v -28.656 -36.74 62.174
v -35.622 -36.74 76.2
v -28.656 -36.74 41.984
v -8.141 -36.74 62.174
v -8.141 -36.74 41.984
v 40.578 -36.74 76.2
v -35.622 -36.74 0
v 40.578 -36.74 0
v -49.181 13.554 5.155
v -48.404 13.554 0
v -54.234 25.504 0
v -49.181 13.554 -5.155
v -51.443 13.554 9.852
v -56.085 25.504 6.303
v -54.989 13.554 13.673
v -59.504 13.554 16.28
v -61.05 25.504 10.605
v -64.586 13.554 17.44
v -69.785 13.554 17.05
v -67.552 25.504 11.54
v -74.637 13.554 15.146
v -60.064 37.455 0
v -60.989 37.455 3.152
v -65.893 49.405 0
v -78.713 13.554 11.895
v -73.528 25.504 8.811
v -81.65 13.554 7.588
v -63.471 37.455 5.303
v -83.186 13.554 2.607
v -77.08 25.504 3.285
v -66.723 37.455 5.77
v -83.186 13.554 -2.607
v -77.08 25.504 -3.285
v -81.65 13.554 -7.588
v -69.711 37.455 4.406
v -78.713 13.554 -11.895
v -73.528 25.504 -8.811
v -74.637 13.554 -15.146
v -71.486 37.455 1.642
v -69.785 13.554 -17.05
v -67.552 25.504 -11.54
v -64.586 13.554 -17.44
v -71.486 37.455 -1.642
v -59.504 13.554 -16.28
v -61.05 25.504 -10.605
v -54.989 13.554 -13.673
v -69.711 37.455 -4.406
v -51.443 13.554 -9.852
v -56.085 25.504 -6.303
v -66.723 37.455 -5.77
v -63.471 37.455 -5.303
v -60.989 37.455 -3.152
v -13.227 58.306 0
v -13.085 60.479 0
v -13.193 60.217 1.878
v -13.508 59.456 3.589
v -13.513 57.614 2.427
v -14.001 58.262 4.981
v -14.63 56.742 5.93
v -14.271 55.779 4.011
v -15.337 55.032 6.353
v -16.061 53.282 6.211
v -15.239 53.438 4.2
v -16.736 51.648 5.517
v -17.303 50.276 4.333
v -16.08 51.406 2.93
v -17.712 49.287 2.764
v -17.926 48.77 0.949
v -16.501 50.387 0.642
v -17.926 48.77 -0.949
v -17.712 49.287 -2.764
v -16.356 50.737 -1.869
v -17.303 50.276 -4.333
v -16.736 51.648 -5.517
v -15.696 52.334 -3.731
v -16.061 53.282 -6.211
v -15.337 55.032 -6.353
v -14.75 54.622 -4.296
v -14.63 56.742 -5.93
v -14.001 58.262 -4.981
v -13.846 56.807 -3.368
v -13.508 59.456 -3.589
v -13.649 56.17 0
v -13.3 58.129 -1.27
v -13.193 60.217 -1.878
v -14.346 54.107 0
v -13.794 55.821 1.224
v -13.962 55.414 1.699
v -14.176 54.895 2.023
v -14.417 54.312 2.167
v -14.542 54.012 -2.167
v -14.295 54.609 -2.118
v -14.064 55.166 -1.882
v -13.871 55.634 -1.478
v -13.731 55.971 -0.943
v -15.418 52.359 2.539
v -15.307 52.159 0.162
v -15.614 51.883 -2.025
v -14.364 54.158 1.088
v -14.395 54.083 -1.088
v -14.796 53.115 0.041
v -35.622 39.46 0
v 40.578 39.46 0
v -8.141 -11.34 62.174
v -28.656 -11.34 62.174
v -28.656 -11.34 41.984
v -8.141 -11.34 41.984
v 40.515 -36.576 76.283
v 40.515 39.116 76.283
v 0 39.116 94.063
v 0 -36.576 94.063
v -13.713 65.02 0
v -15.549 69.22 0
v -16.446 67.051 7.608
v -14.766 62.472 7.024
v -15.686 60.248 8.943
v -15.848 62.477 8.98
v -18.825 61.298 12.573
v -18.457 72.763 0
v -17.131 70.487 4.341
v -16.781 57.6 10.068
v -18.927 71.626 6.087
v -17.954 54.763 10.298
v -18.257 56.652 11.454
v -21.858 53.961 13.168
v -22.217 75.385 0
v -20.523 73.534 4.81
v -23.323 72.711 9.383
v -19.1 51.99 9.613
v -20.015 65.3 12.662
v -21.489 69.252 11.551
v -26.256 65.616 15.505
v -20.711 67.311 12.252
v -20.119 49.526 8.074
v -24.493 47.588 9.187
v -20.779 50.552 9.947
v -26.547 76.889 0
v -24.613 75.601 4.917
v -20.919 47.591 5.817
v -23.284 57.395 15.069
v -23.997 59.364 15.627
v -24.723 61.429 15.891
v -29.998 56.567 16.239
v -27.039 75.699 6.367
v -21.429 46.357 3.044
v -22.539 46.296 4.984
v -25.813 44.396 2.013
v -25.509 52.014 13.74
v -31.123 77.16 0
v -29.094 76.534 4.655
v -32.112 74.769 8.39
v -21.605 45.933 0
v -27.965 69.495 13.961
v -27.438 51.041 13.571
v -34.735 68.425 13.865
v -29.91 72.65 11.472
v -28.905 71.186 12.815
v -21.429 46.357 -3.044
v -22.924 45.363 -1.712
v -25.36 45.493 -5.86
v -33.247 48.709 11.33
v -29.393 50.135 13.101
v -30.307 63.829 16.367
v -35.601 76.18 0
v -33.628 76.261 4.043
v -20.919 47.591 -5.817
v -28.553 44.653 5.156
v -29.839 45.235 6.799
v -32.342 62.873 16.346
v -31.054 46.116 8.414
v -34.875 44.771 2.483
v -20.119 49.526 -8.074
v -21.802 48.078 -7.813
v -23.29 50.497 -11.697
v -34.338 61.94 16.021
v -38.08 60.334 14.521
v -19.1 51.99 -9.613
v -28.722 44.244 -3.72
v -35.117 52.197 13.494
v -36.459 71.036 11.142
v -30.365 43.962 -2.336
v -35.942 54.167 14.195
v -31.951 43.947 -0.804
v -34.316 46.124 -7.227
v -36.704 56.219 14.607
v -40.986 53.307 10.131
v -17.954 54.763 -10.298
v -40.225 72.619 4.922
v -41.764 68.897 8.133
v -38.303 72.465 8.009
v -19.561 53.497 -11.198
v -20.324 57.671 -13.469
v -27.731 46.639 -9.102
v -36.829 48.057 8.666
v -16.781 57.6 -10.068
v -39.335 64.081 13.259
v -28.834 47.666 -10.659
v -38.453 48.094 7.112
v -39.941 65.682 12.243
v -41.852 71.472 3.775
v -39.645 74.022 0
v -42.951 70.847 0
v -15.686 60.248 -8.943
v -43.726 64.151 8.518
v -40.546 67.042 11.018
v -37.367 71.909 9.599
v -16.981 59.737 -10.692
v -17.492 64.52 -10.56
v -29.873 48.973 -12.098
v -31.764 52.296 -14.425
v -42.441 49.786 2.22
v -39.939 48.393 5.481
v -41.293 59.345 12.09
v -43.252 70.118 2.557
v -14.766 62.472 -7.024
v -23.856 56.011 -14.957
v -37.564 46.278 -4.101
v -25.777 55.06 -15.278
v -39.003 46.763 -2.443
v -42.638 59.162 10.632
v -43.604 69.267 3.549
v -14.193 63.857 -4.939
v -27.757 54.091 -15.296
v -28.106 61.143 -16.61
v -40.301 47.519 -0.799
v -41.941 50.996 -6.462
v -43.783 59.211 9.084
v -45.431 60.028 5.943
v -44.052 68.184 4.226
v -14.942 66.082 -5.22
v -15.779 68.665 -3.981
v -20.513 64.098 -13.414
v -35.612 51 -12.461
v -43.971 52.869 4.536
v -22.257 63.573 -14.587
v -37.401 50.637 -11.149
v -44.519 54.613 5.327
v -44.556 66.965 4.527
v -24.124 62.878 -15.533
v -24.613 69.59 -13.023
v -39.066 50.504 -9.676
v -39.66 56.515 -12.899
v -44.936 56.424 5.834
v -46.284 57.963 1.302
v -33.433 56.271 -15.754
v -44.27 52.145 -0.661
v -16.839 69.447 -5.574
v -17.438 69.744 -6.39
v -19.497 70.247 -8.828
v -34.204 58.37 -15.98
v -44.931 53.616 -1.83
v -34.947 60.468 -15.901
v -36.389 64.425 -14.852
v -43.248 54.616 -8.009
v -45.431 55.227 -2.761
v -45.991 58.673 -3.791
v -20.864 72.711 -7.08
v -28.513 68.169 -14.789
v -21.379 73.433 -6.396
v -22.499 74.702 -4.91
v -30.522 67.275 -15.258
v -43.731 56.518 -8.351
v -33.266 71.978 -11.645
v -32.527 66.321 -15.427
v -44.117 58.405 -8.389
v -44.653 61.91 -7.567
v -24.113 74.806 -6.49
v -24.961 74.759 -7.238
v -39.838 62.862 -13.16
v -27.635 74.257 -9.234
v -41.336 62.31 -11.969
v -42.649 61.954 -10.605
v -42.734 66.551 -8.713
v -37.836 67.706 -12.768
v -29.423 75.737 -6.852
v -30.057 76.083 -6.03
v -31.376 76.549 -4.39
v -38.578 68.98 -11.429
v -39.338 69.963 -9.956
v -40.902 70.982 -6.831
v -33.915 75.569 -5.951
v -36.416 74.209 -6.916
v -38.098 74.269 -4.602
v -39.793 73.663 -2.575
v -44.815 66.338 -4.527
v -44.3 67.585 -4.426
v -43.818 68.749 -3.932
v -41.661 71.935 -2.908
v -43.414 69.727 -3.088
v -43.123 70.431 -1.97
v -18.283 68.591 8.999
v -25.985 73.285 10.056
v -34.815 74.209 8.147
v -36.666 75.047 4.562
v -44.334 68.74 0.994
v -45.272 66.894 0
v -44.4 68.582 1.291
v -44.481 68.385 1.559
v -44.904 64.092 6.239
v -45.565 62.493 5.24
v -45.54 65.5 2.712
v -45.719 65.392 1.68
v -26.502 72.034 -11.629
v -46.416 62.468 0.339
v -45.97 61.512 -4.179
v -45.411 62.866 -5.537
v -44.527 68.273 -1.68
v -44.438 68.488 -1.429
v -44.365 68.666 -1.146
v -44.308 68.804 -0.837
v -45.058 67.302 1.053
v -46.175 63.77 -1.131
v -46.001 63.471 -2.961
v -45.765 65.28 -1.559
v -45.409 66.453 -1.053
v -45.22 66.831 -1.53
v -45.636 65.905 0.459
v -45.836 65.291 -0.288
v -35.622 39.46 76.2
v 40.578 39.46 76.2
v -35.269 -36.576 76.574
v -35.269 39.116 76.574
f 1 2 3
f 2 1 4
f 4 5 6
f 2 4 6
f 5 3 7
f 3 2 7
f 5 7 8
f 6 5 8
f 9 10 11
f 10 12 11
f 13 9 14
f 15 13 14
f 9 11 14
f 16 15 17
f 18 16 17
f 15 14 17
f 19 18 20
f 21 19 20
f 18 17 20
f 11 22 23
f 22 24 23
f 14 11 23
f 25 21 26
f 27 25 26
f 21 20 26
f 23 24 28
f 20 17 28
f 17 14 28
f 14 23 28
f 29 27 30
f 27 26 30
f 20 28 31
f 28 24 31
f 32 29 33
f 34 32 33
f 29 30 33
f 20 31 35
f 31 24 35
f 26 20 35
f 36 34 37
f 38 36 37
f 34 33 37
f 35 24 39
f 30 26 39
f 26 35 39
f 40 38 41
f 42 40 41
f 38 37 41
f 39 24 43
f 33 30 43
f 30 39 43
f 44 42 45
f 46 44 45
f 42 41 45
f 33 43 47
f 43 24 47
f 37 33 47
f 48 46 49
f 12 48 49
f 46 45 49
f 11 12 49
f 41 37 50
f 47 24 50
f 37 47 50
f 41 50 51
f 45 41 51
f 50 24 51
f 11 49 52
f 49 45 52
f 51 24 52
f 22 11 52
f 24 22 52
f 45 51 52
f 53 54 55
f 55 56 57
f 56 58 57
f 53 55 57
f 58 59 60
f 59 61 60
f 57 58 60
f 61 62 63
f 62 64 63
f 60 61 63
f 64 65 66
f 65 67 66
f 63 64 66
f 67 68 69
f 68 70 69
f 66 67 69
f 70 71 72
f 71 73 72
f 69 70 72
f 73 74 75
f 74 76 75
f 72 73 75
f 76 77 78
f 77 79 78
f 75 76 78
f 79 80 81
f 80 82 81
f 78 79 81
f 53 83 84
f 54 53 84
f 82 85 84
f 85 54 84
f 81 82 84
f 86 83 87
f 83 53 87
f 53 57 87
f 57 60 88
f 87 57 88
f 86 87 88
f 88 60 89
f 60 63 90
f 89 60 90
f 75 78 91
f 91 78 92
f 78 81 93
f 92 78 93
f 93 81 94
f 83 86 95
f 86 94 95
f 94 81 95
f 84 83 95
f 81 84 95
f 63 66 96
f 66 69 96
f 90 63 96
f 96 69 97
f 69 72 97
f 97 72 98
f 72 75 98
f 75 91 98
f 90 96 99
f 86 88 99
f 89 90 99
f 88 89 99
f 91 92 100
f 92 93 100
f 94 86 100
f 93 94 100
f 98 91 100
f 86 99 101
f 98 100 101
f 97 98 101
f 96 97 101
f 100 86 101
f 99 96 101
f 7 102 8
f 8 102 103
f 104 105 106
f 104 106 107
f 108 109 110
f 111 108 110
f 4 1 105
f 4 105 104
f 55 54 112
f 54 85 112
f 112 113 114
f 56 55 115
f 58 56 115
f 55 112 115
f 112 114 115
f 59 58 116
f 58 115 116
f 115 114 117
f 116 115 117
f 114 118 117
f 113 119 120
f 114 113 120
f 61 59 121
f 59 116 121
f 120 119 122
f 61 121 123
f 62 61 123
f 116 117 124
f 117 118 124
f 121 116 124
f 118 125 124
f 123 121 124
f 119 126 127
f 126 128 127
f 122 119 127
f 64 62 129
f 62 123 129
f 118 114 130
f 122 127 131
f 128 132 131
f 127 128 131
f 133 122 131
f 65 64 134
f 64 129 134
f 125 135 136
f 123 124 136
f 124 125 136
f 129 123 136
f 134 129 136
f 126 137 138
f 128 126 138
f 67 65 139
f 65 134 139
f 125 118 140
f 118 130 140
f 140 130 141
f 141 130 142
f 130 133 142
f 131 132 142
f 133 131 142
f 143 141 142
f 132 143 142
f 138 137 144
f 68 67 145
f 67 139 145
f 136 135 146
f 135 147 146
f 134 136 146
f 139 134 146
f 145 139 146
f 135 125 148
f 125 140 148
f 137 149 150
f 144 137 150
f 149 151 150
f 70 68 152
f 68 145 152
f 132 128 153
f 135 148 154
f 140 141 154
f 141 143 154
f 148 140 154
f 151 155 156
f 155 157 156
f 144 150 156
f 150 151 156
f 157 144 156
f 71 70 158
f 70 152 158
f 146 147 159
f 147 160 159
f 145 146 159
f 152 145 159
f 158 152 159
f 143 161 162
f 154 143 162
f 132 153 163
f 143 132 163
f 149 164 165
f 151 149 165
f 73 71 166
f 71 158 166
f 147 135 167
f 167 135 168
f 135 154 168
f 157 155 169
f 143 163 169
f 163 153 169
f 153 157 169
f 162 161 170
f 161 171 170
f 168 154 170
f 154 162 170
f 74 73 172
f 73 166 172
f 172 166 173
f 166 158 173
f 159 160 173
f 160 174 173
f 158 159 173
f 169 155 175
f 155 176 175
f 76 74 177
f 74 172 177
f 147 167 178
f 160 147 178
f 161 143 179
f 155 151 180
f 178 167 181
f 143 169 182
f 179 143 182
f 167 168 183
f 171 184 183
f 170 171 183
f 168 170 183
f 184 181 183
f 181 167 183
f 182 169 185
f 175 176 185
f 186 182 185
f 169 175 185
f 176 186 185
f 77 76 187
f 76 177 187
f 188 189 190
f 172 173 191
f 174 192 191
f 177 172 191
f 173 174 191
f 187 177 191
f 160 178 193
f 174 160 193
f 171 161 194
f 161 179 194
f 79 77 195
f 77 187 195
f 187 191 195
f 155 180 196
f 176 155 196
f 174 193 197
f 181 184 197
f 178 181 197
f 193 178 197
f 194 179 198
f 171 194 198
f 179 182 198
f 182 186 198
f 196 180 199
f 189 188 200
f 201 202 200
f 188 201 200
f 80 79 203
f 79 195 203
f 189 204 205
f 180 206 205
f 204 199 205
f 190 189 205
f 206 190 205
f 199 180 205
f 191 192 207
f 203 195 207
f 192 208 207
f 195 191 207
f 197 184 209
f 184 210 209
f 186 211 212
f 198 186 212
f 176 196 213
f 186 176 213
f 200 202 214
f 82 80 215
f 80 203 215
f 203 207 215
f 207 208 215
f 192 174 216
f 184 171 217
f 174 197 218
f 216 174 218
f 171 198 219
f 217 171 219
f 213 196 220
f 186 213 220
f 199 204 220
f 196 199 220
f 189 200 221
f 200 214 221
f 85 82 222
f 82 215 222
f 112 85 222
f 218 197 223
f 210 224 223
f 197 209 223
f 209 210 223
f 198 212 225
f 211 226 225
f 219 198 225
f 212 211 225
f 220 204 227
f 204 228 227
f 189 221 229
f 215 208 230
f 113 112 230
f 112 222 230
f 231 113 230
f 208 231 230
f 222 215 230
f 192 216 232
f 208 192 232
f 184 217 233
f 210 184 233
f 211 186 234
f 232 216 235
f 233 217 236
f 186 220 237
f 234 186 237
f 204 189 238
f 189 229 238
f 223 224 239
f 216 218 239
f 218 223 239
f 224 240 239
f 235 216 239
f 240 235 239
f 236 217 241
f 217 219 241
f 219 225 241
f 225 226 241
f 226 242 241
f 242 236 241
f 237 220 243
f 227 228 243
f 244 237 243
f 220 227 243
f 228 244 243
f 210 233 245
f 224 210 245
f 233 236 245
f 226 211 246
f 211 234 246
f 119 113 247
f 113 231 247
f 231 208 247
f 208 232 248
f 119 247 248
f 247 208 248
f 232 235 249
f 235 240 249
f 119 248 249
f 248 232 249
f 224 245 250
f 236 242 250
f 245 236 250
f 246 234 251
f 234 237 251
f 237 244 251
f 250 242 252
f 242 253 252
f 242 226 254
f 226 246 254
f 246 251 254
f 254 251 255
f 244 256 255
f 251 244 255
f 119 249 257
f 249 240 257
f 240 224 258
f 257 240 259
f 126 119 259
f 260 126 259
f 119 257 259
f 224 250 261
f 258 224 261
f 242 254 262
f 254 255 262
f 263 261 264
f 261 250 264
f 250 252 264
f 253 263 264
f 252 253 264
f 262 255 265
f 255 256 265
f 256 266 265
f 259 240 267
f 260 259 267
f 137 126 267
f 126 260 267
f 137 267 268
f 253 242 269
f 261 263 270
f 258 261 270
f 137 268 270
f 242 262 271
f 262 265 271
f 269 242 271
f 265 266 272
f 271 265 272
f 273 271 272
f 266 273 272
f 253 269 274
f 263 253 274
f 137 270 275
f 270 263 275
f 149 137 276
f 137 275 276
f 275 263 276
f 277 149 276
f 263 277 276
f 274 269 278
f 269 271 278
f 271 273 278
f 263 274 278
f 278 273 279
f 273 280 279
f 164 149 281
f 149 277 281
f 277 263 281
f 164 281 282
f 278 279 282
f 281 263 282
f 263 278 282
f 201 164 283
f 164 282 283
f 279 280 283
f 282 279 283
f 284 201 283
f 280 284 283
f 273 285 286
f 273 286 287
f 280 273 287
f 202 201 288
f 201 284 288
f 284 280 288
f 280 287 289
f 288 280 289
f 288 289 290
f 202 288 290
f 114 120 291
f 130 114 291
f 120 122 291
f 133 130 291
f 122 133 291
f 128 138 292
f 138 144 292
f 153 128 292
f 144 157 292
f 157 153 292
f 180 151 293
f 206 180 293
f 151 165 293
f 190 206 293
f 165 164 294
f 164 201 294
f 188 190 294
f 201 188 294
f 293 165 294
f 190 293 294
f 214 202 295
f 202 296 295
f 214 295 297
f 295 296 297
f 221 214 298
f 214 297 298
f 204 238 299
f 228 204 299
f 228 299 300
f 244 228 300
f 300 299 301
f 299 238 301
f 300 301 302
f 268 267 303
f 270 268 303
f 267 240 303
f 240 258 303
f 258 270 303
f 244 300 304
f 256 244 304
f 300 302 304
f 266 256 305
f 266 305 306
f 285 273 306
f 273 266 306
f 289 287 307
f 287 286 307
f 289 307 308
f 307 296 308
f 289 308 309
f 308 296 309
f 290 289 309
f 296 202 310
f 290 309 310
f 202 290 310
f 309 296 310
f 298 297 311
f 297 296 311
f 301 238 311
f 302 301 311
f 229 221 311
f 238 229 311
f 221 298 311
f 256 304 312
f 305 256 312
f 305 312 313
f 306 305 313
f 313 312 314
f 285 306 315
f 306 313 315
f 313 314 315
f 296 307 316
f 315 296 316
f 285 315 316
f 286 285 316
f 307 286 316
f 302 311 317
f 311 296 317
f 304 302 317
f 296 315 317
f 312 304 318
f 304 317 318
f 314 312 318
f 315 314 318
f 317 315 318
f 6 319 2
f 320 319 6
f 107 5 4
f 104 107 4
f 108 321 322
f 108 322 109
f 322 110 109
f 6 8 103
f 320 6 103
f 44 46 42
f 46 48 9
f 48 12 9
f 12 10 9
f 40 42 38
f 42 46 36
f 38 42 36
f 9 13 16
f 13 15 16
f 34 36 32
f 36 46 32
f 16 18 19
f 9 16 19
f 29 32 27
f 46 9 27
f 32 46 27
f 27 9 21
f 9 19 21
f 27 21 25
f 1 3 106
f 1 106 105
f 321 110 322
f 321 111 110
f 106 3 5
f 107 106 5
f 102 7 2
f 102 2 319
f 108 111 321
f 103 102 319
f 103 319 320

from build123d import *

# Parameters (mm, degrees)
F0_W          = 76.2
F0_H          = 76.2
F1_DEPTH      = 76.2
F3_DEPTH      = 36.576
F3_DEPTH_BACK = 39.116
F4_W          = 20.5152919516
F4_H          = 20.1896540821
F5_DEPTH      = 25.4


with BuildPart() as f1:
    # F0 (on Top) → F1 (new body)
    with BuildSketch(Plane.XY):
        with Locations((2.4775415659, 1.3604956046)):
            Rectangle(F0_W, F0_H)
    extrude(amount=F1_DEPTH)

    # F4 (on face) → F5 (cut)
    with BuildSketch(Plane.XZ.offset(36.7395043954)):
        with Locations((-18.3986336924, 52.0787220448)):
            Rectangle(F4_W, F4_H)
    extrude(amount=-F5_DEPTH, mode=Mode.SUBTRACT)


with BuildPart() as f3:
    # F2 (on Front) → F3 (new body, two sides)
    with BuildSketch(Plane.XZ) as f3_sk:
        Polygon((0, 94.062961638), (-35.2685265243, 76.5744373202), (40.5150838196, 76.2829631567), align=None)
    extrude(amount=F3_DEPTH)
    extrude(f3_sk.sketch, amount=-F3_DEPTH_BACK)


with BuildPart() as f7:
    # F6 (on Top) → F7 (revolve)
    with BuildSketch(Plane.XY):
        Polygon((-48.4044924378, 13.5536063462), (-65.8930167556, 49.4050830603), (-65.8930167556, 13.5536063462), align=None)
    revolve(axis=Axis((-65.8930167556, 31.4793447033, 0), (0, -1, 0)))


with BuildPart() as f9:
    # F8 (on Top) → F9 (revolve)
    with BuildSketch(Plane.XY):
        with BuildLine():
            ThreePointArc((-14.3457819904, 54.1065082938), (-13.4031332861, 57.2308972482), (-13.0848816663, 60.4788364139))
            ThreePointArc((-13.0848816663, 60.4788364139), (-26.5470794009, 76.8887728412), (-45.2717542648, 66.893607378))
            Line((-45.2717542648, 66.893607378), (-14.3457819904, 54.1065082938))
        make_face()
    revolve(axis=Axis((-29.8087681276, 60.5000578359, 0), (0.9241208389, -0.3821003469, 0)))


solid = Compound([f1.part, f3.part, f7.part, f9.part])
